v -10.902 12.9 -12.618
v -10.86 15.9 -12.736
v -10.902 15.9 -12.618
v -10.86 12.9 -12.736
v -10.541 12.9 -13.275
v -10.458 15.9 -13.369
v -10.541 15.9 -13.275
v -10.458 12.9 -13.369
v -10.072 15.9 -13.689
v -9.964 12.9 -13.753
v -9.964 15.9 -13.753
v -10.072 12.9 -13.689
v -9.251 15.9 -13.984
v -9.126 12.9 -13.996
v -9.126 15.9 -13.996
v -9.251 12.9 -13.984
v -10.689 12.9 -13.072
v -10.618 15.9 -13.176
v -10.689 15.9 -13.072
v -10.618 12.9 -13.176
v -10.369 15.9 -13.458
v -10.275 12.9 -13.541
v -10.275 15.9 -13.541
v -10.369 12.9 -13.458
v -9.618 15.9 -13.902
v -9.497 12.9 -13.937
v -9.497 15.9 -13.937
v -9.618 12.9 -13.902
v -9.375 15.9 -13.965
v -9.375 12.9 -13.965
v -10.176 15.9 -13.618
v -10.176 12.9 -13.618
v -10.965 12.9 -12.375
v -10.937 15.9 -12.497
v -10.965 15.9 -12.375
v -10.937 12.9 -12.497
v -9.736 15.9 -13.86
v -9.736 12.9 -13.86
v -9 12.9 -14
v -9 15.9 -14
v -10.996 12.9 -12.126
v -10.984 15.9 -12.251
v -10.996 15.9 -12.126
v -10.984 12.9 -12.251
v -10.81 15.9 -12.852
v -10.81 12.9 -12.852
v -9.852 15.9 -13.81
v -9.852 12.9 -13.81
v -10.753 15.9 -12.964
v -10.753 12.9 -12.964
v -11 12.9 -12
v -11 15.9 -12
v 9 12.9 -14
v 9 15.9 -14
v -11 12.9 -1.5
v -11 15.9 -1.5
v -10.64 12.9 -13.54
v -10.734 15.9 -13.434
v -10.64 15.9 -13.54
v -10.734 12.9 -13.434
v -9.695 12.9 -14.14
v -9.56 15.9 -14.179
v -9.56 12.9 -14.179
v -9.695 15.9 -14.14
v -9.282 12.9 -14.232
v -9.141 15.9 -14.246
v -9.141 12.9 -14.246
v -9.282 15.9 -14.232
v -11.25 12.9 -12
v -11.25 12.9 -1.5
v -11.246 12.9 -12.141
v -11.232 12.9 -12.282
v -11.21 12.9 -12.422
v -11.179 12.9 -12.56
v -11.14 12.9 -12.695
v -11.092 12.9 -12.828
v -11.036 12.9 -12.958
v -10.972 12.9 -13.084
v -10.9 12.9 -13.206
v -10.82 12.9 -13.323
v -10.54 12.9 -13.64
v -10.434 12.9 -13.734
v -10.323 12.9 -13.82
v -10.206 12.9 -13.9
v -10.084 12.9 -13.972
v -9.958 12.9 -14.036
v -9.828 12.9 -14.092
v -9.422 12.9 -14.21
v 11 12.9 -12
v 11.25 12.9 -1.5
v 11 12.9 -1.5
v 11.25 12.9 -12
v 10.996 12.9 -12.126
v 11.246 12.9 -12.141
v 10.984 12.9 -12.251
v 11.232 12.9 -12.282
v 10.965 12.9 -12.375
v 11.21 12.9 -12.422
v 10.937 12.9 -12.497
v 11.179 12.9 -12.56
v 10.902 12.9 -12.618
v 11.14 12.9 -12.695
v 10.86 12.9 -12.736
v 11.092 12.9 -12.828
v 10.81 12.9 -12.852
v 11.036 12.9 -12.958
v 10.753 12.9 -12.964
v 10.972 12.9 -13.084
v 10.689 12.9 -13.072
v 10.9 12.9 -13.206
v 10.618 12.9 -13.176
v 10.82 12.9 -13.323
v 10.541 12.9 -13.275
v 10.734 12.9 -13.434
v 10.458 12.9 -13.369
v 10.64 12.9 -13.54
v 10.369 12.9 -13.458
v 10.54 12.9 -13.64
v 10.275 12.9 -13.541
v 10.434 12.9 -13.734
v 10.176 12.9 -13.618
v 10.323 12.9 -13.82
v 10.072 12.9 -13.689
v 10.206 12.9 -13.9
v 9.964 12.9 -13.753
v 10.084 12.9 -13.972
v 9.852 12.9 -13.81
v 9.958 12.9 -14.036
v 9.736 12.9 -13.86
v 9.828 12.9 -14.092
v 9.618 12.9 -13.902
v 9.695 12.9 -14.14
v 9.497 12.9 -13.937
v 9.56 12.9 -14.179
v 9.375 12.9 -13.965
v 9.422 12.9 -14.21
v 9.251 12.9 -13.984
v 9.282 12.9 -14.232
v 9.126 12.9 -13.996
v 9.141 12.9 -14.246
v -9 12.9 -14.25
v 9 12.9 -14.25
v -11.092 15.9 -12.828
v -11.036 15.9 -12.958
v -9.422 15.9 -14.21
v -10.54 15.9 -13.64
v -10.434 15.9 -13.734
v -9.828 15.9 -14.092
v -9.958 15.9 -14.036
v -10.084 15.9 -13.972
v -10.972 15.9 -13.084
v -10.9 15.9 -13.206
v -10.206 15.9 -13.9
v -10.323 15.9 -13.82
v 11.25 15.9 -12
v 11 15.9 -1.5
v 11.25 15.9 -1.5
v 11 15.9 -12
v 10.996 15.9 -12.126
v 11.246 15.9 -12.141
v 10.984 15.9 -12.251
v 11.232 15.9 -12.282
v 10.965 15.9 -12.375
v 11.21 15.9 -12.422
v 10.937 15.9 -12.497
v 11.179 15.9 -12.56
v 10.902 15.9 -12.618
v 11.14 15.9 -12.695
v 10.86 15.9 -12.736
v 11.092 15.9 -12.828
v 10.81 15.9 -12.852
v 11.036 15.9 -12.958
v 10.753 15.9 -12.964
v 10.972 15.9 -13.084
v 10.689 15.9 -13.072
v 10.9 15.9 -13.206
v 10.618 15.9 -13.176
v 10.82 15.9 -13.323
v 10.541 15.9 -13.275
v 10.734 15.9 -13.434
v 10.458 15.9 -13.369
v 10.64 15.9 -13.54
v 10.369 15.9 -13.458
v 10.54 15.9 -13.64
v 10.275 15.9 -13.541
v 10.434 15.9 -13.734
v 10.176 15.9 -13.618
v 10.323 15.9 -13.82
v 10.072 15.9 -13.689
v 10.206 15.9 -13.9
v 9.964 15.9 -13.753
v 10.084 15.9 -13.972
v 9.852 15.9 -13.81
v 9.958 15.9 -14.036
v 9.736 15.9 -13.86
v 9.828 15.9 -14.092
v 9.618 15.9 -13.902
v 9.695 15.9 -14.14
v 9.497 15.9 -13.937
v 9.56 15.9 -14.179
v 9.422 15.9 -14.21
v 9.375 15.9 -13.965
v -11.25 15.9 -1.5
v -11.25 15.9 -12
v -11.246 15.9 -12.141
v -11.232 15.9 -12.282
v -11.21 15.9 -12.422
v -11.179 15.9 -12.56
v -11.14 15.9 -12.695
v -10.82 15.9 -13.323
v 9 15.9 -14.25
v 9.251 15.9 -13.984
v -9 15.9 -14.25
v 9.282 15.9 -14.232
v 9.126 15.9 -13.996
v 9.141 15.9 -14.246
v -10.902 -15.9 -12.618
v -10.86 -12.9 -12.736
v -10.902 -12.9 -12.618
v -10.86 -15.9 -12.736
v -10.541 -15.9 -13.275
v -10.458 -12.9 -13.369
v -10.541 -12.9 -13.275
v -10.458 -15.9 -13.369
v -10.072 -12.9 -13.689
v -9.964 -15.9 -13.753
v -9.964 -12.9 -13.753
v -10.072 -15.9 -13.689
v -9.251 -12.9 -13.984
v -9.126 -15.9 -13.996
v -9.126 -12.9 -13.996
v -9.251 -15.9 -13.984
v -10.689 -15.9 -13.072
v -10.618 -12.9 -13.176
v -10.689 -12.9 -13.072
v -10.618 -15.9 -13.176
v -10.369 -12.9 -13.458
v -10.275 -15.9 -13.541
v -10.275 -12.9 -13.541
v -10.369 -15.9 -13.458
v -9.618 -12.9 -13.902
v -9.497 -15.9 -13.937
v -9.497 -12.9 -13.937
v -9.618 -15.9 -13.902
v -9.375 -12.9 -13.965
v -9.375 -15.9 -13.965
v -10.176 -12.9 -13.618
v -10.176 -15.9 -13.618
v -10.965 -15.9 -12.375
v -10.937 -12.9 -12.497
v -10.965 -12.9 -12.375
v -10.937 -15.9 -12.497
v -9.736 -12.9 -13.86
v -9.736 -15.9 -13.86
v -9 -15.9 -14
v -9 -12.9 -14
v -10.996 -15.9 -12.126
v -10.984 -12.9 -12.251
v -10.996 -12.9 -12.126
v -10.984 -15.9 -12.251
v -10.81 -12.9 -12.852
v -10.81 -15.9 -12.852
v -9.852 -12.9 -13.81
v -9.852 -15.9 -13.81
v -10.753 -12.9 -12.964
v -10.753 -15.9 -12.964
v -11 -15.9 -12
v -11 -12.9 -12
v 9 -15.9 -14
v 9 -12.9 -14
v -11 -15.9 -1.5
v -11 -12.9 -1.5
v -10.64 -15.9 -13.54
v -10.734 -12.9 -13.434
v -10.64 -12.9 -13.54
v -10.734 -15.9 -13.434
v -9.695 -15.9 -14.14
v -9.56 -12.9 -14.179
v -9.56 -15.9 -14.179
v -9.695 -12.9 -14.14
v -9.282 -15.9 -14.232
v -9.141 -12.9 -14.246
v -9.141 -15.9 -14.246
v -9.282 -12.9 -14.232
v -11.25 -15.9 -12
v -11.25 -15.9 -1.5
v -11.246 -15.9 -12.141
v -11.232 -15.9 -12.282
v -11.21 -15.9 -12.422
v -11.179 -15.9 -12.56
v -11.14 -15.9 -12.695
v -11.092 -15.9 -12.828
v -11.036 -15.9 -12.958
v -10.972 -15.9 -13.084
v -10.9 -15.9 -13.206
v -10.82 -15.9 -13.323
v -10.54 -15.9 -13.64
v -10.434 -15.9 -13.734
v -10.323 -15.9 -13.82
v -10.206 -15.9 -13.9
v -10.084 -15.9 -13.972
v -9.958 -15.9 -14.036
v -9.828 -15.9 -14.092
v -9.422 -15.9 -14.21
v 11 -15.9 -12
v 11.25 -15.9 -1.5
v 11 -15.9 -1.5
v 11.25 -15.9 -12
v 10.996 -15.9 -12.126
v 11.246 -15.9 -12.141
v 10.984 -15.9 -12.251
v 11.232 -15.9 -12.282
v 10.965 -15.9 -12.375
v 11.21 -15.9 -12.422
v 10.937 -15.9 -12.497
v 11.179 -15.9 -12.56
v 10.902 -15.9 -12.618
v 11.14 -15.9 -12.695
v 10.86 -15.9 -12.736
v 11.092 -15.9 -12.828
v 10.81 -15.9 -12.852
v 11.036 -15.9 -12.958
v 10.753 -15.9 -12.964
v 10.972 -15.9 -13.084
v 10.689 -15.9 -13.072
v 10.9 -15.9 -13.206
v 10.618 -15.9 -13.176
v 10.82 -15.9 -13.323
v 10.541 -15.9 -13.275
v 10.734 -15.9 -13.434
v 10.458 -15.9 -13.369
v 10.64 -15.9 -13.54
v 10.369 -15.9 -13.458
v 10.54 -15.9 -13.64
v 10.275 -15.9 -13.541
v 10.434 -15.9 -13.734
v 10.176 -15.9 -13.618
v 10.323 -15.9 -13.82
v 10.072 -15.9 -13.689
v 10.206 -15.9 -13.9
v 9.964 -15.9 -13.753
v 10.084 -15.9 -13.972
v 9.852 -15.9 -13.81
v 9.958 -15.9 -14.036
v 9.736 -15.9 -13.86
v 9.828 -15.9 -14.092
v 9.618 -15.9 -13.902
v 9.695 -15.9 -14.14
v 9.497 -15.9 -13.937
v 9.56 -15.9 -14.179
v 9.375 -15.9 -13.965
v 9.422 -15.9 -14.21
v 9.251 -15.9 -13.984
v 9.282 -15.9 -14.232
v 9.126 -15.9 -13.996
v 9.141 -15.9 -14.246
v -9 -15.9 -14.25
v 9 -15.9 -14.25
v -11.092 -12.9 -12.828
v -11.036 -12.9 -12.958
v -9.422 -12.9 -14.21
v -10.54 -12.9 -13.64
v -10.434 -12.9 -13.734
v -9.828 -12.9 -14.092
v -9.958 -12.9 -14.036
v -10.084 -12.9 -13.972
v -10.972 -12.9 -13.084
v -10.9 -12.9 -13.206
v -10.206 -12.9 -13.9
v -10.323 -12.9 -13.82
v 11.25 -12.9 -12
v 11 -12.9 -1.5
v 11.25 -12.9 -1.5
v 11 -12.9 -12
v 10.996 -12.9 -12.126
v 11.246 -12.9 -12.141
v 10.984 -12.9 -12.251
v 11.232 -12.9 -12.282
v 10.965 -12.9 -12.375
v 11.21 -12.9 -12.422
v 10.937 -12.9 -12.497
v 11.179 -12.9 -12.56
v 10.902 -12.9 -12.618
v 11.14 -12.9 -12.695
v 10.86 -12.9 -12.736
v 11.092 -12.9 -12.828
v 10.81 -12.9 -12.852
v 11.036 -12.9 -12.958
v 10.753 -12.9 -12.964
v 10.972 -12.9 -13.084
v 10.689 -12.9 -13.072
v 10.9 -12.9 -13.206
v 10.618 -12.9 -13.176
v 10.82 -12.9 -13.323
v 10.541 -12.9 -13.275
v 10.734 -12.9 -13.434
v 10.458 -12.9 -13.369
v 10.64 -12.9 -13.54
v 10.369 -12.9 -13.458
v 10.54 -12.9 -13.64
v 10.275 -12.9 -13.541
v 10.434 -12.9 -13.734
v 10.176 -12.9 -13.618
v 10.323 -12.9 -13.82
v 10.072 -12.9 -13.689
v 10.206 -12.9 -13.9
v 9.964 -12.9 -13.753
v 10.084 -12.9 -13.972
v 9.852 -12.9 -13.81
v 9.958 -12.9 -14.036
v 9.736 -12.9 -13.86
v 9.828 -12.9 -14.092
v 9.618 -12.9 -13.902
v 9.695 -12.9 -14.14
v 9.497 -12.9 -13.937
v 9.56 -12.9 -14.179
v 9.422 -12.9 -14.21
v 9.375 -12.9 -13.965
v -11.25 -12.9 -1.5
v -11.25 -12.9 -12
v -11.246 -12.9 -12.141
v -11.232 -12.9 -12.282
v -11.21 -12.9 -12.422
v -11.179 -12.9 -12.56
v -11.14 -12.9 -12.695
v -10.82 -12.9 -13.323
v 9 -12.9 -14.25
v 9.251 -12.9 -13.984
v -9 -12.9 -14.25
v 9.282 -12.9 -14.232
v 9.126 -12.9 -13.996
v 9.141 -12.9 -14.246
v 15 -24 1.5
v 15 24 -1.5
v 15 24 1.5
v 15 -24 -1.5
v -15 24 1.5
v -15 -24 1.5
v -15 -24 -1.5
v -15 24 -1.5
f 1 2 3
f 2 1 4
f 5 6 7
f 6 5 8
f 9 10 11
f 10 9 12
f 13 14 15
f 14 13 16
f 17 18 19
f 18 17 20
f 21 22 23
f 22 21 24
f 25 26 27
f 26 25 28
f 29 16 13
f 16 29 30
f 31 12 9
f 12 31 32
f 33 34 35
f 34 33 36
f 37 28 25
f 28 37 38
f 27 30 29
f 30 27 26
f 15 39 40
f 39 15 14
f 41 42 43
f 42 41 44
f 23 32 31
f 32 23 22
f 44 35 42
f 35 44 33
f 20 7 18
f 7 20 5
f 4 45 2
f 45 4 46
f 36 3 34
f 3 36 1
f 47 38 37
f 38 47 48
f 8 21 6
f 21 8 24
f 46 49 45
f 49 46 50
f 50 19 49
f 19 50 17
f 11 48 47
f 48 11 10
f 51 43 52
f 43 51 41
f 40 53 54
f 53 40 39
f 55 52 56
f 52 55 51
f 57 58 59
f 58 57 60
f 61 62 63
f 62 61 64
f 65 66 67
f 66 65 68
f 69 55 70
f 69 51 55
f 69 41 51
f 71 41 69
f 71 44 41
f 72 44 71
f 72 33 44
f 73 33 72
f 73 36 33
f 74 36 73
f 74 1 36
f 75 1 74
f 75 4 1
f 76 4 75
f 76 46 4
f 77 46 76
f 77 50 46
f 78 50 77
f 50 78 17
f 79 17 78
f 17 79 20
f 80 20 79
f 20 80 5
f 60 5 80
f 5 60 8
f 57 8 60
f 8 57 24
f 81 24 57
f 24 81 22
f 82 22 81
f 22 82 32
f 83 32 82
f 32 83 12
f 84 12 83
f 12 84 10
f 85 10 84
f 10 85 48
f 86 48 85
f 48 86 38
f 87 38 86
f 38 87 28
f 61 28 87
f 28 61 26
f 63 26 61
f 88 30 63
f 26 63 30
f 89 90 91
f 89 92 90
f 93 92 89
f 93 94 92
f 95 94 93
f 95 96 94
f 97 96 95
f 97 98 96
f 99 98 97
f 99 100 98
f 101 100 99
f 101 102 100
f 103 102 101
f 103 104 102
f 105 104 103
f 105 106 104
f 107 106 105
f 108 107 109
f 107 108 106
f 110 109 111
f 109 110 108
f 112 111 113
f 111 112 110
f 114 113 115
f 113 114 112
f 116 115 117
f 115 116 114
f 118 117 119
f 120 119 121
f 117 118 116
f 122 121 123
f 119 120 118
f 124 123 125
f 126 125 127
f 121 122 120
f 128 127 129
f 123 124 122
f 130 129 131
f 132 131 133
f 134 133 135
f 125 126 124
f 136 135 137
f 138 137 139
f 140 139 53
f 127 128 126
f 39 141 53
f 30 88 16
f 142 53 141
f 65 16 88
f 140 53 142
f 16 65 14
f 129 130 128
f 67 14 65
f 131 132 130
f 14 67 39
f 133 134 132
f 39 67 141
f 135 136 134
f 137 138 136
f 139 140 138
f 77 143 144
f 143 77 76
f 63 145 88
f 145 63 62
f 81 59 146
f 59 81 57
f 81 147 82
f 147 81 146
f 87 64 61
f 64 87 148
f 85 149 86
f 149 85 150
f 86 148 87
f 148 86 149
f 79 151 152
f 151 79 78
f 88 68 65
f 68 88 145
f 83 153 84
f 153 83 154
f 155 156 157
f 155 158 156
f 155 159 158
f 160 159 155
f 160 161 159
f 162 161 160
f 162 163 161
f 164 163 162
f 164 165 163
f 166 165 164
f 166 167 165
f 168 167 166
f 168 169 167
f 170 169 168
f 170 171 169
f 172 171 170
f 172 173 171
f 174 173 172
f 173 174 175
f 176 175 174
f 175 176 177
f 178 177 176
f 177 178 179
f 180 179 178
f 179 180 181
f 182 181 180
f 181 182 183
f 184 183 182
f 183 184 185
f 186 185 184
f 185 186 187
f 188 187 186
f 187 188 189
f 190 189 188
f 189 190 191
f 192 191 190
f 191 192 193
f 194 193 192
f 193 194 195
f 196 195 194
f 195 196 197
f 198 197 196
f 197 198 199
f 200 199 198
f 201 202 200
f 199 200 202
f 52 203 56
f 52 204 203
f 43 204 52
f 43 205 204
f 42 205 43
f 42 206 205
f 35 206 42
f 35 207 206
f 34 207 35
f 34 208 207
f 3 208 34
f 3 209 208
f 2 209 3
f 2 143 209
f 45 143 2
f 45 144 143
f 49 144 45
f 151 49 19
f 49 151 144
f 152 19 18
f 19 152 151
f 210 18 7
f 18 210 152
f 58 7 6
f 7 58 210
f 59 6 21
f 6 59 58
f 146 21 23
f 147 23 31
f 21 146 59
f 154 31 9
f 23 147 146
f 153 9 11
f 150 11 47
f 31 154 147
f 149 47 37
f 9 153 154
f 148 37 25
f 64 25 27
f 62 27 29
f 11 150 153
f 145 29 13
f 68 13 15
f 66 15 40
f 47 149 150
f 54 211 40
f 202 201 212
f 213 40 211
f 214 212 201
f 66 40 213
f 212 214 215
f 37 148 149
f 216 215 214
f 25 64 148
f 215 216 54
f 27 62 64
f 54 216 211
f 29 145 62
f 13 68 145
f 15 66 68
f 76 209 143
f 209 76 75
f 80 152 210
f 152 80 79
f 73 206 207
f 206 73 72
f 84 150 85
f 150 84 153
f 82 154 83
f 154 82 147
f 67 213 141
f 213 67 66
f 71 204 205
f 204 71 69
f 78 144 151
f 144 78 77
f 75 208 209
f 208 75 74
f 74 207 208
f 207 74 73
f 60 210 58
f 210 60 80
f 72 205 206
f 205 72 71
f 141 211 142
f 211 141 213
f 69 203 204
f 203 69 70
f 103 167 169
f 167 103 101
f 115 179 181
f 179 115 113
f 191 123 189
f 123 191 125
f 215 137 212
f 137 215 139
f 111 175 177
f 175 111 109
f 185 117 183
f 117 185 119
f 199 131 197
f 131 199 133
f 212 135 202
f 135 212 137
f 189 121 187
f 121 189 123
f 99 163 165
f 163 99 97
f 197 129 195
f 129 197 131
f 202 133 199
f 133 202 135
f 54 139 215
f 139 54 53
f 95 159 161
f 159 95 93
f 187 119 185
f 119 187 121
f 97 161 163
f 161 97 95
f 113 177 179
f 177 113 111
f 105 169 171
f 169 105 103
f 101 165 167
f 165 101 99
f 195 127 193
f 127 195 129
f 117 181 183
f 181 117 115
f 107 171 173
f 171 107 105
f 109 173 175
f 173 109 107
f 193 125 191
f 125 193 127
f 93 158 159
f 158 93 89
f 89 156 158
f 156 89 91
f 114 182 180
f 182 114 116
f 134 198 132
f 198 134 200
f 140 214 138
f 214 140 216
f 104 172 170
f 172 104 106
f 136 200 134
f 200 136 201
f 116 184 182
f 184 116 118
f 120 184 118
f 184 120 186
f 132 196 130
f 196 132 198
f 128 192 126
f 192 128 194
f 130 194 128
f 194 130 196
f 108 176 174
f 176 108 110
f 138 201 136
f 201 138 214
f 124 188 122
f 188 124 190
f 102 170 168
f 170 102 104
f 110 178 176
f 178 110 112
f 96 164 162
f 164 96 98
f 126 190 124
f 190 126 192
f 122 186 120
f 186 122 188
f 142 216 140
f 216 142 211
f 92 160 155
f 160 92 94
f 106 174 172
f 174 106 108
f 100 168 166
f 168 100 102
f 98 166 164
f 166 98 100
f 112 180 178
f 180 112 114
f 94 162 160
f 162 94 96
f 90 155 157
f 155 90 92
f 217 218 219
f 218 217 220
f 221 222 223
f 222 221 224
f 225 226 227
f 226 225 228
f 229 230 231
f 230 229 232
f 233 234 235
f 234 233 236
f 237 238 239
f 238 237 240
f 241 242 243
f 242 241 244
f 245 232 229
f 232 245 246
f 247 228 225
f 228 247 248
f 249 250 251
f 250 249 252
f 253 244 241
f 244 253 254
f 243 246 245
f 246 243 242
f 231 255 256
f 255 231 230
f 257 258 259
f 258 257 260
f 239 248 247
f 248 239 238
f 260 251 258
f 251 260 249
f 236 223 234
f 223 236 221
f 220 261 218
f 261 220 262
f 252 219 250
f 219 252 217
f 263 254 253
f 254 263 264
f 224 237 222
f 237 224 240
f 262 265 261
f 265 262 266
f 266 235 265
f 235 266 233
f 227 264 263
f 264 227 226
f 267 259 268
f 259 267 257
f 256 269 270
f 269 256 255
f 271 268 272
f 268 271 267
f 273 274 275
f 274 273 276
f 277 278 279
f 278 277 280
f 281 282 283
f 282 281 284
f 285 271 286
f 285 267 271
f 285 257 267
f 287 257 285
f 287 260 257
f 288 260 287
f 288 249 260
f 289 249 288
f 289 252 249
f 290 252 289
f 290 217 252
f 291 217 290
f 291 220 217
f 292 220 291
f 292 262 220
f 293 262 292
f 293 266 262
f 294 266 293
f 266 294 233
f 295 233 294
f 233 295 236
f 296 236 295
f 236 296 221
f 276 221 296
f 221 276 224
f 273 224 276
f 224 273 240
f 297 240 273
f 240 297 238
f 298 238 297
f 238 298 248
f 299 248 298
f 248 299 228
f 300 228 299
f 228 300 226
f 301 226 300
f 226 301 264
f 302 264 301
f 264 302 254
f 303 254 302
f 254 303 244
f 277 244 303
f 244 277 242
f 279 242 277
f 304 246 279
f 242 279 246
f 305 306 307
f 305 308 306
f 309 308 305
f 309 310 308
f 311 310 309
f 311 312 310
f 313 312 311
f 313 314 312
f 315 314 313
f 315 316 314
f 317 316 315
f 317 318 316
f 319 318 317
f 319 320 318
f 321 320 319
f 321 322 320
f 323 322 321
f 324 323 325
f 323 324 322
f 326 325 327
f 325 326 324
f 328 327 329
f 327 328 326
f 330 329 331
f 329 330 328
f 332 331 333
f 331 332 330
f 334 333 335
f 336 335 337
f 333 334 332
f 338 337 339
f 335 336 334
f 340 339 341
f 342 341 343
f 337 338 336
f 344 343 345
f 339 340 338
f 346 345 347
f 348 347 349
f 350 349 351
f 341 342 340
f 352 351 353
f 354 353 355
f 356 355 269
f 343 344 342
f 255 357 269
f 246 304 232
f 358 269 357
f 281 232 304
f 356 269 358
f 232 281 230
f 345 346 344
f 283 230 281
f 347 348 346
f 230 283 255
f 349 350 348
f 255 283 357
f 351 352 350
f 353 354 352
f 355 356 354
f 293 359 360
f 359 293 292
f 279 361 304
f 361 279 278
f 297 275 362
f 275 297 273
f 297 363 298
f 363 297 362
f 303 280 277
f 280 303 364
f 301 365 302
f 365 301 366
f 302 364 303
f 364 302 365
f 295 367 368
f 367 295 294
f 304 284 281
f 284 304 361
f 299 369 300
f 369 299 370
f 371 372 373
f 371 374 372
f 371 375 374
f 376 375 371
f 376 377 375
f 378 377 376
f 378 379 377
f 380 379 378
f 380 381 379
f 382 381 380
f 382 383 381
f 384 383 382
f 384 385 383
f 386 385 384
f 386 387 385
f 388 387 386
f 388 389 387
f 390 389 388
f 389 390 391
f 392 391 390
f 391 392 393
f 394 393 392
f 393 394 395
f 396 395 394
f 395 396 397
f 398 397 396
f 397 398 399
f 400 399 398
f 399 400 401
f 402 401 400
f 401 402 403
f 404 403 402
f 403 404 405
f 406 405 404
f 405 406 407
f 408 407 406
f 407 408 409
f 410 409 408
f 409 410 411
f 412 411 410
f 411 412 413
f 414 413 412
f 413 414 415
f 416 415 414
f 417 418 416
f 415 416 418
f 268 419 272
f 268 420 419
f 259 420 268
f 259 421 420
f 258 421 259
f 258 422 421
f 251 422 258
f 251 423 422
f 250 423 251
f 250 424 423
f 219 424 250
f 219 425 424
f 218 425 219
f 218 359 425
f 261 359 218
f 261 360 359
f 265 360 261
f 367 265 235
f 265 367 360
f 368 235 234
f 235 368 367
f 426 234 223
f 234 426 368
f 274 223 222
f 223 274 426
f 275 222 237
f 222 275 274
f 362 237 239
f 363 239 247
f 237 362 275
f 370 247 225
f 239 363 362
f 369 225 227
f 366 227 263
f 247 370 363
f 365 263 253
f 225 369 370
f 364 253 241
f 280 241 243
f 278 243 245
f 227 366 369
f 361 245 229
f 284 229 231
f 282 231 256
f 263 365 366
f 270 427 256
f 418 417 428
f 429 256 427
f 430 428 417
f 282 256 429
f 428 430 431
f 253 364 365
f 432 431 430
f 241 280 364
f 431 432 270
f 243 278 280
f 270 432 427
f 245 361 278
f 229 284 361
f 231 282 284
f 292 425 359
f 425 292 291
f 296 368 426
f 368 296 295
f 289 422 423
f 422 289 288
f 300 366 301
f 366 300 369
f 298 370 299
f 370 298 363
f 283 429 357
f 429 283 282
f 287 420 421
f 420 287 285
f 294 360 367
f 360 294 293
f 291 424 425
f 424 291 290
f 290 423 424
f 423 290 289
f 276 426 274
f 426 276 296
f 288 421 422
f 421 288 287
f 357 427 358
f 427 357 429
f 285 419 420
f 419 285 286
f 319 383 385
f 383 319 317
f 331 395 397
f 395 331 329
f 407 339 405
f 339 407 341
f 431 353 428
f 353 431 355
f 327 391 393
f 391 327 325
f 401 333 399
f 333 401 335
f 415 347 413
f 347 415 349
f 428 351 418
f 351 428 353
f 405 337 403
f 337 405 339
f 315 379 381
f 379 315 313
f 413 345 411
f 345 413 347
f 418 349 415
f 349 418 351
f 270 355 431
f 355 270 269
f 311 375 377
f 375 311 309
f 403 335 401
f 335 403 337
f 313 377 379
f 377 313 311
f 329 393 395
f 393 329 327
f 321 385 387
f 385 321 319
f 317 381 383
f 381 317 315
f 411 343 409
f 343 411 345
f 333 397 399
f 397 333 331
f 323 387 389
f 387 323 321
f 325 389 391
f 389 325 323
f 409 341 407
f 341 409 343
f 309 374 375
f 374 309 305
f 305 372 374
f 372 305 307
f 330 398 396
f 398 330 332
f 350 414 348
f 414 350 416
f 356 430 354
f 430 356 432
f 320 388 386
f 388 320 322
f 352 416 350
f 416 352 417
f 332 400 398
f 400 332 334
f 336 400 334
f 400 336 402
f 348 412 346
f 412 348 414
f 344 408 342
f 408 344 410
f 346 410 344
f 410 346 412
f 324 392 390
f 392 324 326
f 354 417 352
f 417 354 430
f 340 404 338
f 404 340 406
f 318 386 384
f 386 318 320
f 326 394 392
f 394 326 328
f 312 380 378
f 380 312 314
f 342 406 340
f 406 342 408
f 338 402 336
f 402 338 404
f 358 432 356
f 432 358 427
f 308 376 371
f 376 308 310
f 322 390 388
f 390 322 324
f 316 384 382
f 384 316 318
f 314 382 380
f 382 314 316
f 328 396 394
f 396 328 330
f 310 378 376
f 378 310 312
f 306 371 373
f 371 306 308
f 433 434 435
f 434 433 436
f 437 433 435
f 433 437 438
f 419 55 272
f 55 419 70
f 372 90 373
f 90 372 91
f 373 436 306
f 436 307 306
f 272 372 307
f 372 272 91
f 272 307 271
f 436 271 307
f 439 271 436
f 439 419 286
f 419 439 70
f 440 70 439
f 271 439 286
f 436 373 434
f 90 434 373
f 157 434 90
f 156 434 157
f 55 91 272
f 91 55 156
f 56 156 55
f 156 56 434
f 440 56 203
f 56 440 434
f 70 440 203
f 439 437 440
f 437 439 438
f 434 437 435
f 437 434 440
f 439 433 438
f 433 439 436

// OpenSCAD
// file: legs.scad
// (c) 2011 Christopher "ScribbleJ" Jansen
// 
// bend() module - creates a cube with a U or L shaped bend of the specified
// radius.

// d1 = length of first cube segment
// d2 = length of second cube segment
// r = (inner) radius of bend
// w = width of cube
// a = angle of bend.  0 = U, 180 = ---
// h = height of cube

$fn=100;

module bend(d1=10,d2=10,r=10,w=5,a=0,h=10)
{
  huge = r*w;
  difference()
  {
     cylinder(r=r+w, h=h);

    translate([0,0,-0.5]) 
    {
      cylinder(r=r, h=h+1);
      translate([0,0,0]) cube([d1+1, r, h+1]);
      rotate([0,0,-a]) translate([0,-r,0]) cube([d2+1, r, h+1]);
      translate([-0.05,-d2-1+0.05,0]) cube([d1+1, d2+1, h+1]);
    }
  }

  translate([0,r,0]) cube([d1, w, h]);
  rotate([0,0,-a]) translate([0,-(r+w),0]) cube([d2, w, h]);
}


module legs(width=2*12, height=1*12, r=2, w=0.5, a=90, h=4){
  d2=height;
  d1=width/2; 
  translate([0,-h/2,0]){
    union(){
      rotate([-90,0,0]) translate([-d1,d2,0]) color("silver") bend(d1=d1, d2=d2, r=r, w=w, a=a, h=h);
      mirror([1,0,0]) rotate([-90,0,0]) translate([-d1,d2,0]) color("silver") bend(d1=d1, d2=d2, r=r, w=w, a=a, h=h);
    };};
}
// main file
$fn=100;

include <./legs.scad>
// Define slab for top of table
slab_width=2.5*12;
slab_length=4*12;
slab_depth=3;
module slab(){
  cube([slab_width,slab_length,slab_depth],center=true);
};

// Legs
leg_thickness=0.25;
leg_width=3;
leg_length=0.6*slab_width;
leg_height=2*12;


color("sienna") slab();
color("black") translate([0,slab_length/2*0.6,0]) legs(width=leg_length, h=leg_width, w=leg_thickness);
color("black") translate([0,-slab_length/2*0.6,0]) legs(width=leg_length, h=leg_width, w=leg_thickness);
